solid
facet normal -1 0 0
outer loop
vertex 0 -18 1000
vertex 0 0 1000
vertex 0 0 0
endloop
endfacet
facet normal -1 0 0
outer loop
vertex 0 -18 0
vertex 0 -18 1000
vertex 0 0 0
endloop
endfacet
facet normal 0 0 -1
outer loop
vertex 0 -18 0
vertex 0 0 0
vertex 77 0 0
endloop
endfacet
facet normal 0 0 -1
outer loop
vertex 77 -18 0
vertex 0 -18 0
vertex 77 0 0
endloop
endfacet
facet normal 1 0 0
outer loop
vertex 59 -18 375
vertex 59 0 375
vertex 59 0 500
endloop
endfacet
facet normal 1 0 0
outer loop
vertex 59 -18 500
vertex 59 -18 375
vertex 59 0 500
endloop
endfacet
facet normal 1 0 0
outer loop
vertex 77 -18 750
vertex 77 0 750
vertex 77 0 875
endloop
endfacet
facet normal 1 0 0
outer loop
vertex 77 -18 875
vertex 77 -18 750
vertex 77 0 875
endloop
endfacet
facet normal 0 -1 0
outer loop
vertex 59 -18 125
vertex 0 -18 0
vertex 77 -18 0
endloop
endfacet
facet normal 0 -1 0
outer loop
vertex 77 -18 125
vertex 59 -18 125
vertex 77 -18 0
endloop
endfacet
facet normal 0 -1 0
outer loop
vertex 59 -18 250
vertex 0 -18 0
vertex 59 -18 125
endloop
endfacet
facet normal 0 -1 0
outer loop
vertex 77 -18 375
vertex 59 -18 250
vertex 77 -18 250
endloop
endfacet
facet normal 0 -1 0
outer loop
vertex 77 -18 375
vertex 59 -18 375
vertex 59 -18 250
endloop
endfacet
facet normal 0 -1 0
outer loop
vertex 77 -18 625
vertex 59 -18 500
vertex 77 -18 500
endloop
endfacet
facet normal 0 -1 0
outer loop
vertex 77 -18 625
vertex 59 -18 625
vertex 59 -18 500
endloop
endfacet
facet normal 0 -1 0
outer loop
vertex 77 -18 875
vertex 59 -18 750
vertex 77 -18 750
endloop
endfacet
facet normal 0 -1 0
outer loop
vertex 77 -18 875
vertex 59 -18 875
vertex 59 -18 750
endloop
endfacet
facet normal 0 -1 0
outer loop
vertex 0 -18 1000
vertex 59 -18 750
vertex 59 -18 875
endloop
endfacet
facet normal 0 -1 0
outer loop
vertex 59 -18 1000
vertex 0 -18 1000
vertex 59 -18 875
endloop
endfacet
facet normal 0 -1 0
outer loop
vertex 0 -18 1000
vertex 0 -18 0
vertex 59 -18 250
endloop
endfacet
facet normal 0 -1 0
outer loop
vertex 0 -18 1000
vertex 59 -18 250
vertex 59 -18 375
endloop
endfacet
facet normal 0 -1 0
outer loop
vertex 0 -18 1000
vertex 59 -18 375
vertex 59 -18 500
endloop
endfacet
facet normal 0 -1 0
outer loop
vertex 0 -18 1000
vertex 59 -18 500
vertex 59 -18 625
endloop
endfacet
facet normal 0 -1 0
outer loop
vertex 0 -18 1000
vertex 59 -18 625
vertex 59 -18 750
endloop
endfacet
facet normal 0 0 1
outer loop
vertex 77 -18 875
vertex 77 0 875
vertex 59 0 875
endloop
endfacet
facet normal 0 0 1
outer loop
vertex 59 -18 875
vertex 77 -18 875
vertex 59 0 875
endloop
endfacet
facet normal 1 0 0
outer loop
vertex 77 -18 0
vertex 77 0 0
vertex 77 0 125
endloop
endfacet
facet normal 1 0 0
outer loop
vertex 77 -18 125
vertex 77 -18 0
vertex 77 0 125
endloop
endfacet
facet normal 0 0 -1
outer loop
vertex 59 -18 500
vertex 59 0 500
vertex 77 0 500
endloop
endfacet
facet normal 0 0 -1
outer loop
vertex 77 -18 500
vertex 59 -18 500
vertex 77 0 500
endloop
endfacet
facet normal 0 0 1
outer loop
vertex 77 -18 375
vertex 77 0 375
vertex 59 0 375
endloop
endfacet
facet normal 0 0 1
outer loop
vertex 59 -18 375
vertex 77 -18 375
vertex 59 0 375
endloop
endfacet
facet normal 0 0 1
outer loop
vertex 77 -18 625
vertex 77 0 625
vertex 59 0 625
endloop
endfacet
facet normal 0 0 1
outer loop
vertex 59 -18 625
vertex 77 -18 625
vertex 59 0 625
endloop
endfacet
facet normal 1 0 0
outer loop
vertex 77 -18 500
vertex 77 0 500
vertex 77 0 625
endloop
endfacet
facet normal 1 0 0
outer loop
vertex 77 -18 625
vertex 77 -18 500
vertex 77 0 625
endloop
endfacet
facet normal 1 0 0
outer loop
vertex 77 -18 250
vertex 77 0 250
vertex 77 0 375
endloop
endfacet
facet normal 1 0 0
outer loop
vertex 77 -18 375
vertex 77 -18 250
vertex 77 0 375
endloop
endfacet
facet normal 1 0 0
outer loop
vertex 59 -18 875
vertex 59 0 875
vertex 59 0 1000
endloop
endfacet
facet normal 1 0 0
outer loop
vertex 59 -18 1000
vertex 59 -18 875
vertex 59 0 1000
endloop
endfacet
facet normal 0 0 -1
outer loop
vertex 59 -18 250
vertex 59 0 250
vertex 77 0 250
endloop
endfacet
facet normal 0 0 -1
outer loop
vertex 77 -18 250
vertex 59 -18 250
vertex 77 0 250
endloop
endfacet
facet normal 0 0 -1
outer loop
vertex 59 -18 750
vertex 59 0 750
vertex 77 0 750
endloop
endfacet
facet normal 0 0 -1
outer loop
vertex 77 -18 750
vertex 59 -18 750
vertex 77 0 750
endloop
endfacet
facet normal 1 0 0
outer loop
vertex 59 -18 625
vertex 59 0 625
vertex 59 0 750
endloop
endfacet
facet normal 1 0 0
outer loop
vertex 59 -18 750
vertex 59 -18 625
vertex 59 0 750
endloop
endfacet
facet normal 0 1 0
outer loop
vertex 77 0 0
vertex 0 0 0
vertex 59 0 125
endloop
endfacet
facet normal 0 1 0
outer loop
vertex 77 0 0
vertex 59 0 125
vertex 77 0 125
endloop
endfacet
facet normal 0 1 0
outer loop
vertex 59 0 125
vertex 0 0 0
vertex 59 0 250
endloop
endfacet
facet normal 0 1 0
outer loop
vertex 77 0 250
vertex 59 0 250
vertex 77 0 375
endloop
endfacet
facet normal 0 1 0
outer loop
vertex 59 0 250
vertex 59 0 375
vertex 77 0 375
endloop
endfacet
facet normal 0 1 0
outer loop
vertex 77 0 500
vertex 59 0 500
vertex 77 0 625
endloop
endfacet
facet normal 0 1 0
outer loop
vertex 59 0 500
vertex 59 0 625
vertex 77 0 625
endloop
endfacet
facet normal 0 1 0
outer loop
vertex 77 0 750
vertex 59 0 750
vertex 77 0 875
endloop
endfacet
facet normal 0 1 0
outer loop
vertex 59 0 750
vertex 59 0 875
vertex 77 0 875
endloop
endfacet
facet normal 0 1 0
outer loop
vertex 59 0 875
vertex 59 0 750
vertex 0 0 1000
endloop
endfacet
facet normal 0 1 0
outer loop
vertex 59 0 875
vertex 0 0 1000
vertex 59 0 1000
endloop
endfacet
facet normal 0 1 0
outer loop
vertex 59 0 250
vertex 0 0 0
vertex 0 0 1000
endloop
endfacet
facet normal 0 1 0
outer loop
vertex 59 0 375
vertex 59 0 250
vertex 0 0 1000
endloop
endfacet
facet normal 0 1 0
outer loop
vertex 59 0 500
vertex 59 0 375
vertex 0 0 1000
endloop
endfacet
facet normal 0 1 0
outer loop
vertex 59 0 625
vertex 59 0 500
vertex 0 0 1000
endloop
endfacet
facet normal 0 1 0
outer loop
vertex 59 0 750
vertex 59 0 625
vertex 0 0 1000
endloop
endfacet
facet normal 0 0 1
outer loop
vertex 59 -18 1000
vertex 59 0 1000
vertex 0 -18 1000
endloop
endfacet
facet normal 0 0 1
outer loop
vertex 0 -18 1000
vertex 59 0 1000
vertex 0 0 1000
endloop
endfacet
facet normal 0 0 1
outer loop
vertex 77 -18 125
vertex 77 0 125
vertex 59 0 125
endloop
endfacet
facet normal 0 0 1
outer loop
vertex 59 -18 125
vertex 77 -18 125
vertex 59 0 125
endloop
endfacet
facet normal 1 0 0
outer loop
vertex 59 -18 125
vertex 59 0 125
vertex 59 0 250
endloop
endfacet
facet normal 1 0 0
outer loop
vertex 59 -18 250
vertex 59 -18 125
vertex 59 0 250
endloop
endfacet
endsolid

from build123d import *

# Parameters (mm, degrees)
F1_DEPTH = 18


# Not quite as in the source:
# - a feature names something its author has since deleted; it is built from what else it names


with BuildPart() as f1:
    # F0 (on Front) → F1 (new body)
    with BuildSketch(Plane.XZ):
        Polygon((0, 1000), (0, 0), (77, 0), (77, 125), (59, 125), (59, 250), (77, 250), (77, 375), (59, 375), (59, 500), (77, 500), (77, 625), (59, 625), (59, 750), (77, 750), (77, 875), (59, 875), (59, 1000), align=None)
    extrude(amount=F1_DEPTH)


solid = f1.part
